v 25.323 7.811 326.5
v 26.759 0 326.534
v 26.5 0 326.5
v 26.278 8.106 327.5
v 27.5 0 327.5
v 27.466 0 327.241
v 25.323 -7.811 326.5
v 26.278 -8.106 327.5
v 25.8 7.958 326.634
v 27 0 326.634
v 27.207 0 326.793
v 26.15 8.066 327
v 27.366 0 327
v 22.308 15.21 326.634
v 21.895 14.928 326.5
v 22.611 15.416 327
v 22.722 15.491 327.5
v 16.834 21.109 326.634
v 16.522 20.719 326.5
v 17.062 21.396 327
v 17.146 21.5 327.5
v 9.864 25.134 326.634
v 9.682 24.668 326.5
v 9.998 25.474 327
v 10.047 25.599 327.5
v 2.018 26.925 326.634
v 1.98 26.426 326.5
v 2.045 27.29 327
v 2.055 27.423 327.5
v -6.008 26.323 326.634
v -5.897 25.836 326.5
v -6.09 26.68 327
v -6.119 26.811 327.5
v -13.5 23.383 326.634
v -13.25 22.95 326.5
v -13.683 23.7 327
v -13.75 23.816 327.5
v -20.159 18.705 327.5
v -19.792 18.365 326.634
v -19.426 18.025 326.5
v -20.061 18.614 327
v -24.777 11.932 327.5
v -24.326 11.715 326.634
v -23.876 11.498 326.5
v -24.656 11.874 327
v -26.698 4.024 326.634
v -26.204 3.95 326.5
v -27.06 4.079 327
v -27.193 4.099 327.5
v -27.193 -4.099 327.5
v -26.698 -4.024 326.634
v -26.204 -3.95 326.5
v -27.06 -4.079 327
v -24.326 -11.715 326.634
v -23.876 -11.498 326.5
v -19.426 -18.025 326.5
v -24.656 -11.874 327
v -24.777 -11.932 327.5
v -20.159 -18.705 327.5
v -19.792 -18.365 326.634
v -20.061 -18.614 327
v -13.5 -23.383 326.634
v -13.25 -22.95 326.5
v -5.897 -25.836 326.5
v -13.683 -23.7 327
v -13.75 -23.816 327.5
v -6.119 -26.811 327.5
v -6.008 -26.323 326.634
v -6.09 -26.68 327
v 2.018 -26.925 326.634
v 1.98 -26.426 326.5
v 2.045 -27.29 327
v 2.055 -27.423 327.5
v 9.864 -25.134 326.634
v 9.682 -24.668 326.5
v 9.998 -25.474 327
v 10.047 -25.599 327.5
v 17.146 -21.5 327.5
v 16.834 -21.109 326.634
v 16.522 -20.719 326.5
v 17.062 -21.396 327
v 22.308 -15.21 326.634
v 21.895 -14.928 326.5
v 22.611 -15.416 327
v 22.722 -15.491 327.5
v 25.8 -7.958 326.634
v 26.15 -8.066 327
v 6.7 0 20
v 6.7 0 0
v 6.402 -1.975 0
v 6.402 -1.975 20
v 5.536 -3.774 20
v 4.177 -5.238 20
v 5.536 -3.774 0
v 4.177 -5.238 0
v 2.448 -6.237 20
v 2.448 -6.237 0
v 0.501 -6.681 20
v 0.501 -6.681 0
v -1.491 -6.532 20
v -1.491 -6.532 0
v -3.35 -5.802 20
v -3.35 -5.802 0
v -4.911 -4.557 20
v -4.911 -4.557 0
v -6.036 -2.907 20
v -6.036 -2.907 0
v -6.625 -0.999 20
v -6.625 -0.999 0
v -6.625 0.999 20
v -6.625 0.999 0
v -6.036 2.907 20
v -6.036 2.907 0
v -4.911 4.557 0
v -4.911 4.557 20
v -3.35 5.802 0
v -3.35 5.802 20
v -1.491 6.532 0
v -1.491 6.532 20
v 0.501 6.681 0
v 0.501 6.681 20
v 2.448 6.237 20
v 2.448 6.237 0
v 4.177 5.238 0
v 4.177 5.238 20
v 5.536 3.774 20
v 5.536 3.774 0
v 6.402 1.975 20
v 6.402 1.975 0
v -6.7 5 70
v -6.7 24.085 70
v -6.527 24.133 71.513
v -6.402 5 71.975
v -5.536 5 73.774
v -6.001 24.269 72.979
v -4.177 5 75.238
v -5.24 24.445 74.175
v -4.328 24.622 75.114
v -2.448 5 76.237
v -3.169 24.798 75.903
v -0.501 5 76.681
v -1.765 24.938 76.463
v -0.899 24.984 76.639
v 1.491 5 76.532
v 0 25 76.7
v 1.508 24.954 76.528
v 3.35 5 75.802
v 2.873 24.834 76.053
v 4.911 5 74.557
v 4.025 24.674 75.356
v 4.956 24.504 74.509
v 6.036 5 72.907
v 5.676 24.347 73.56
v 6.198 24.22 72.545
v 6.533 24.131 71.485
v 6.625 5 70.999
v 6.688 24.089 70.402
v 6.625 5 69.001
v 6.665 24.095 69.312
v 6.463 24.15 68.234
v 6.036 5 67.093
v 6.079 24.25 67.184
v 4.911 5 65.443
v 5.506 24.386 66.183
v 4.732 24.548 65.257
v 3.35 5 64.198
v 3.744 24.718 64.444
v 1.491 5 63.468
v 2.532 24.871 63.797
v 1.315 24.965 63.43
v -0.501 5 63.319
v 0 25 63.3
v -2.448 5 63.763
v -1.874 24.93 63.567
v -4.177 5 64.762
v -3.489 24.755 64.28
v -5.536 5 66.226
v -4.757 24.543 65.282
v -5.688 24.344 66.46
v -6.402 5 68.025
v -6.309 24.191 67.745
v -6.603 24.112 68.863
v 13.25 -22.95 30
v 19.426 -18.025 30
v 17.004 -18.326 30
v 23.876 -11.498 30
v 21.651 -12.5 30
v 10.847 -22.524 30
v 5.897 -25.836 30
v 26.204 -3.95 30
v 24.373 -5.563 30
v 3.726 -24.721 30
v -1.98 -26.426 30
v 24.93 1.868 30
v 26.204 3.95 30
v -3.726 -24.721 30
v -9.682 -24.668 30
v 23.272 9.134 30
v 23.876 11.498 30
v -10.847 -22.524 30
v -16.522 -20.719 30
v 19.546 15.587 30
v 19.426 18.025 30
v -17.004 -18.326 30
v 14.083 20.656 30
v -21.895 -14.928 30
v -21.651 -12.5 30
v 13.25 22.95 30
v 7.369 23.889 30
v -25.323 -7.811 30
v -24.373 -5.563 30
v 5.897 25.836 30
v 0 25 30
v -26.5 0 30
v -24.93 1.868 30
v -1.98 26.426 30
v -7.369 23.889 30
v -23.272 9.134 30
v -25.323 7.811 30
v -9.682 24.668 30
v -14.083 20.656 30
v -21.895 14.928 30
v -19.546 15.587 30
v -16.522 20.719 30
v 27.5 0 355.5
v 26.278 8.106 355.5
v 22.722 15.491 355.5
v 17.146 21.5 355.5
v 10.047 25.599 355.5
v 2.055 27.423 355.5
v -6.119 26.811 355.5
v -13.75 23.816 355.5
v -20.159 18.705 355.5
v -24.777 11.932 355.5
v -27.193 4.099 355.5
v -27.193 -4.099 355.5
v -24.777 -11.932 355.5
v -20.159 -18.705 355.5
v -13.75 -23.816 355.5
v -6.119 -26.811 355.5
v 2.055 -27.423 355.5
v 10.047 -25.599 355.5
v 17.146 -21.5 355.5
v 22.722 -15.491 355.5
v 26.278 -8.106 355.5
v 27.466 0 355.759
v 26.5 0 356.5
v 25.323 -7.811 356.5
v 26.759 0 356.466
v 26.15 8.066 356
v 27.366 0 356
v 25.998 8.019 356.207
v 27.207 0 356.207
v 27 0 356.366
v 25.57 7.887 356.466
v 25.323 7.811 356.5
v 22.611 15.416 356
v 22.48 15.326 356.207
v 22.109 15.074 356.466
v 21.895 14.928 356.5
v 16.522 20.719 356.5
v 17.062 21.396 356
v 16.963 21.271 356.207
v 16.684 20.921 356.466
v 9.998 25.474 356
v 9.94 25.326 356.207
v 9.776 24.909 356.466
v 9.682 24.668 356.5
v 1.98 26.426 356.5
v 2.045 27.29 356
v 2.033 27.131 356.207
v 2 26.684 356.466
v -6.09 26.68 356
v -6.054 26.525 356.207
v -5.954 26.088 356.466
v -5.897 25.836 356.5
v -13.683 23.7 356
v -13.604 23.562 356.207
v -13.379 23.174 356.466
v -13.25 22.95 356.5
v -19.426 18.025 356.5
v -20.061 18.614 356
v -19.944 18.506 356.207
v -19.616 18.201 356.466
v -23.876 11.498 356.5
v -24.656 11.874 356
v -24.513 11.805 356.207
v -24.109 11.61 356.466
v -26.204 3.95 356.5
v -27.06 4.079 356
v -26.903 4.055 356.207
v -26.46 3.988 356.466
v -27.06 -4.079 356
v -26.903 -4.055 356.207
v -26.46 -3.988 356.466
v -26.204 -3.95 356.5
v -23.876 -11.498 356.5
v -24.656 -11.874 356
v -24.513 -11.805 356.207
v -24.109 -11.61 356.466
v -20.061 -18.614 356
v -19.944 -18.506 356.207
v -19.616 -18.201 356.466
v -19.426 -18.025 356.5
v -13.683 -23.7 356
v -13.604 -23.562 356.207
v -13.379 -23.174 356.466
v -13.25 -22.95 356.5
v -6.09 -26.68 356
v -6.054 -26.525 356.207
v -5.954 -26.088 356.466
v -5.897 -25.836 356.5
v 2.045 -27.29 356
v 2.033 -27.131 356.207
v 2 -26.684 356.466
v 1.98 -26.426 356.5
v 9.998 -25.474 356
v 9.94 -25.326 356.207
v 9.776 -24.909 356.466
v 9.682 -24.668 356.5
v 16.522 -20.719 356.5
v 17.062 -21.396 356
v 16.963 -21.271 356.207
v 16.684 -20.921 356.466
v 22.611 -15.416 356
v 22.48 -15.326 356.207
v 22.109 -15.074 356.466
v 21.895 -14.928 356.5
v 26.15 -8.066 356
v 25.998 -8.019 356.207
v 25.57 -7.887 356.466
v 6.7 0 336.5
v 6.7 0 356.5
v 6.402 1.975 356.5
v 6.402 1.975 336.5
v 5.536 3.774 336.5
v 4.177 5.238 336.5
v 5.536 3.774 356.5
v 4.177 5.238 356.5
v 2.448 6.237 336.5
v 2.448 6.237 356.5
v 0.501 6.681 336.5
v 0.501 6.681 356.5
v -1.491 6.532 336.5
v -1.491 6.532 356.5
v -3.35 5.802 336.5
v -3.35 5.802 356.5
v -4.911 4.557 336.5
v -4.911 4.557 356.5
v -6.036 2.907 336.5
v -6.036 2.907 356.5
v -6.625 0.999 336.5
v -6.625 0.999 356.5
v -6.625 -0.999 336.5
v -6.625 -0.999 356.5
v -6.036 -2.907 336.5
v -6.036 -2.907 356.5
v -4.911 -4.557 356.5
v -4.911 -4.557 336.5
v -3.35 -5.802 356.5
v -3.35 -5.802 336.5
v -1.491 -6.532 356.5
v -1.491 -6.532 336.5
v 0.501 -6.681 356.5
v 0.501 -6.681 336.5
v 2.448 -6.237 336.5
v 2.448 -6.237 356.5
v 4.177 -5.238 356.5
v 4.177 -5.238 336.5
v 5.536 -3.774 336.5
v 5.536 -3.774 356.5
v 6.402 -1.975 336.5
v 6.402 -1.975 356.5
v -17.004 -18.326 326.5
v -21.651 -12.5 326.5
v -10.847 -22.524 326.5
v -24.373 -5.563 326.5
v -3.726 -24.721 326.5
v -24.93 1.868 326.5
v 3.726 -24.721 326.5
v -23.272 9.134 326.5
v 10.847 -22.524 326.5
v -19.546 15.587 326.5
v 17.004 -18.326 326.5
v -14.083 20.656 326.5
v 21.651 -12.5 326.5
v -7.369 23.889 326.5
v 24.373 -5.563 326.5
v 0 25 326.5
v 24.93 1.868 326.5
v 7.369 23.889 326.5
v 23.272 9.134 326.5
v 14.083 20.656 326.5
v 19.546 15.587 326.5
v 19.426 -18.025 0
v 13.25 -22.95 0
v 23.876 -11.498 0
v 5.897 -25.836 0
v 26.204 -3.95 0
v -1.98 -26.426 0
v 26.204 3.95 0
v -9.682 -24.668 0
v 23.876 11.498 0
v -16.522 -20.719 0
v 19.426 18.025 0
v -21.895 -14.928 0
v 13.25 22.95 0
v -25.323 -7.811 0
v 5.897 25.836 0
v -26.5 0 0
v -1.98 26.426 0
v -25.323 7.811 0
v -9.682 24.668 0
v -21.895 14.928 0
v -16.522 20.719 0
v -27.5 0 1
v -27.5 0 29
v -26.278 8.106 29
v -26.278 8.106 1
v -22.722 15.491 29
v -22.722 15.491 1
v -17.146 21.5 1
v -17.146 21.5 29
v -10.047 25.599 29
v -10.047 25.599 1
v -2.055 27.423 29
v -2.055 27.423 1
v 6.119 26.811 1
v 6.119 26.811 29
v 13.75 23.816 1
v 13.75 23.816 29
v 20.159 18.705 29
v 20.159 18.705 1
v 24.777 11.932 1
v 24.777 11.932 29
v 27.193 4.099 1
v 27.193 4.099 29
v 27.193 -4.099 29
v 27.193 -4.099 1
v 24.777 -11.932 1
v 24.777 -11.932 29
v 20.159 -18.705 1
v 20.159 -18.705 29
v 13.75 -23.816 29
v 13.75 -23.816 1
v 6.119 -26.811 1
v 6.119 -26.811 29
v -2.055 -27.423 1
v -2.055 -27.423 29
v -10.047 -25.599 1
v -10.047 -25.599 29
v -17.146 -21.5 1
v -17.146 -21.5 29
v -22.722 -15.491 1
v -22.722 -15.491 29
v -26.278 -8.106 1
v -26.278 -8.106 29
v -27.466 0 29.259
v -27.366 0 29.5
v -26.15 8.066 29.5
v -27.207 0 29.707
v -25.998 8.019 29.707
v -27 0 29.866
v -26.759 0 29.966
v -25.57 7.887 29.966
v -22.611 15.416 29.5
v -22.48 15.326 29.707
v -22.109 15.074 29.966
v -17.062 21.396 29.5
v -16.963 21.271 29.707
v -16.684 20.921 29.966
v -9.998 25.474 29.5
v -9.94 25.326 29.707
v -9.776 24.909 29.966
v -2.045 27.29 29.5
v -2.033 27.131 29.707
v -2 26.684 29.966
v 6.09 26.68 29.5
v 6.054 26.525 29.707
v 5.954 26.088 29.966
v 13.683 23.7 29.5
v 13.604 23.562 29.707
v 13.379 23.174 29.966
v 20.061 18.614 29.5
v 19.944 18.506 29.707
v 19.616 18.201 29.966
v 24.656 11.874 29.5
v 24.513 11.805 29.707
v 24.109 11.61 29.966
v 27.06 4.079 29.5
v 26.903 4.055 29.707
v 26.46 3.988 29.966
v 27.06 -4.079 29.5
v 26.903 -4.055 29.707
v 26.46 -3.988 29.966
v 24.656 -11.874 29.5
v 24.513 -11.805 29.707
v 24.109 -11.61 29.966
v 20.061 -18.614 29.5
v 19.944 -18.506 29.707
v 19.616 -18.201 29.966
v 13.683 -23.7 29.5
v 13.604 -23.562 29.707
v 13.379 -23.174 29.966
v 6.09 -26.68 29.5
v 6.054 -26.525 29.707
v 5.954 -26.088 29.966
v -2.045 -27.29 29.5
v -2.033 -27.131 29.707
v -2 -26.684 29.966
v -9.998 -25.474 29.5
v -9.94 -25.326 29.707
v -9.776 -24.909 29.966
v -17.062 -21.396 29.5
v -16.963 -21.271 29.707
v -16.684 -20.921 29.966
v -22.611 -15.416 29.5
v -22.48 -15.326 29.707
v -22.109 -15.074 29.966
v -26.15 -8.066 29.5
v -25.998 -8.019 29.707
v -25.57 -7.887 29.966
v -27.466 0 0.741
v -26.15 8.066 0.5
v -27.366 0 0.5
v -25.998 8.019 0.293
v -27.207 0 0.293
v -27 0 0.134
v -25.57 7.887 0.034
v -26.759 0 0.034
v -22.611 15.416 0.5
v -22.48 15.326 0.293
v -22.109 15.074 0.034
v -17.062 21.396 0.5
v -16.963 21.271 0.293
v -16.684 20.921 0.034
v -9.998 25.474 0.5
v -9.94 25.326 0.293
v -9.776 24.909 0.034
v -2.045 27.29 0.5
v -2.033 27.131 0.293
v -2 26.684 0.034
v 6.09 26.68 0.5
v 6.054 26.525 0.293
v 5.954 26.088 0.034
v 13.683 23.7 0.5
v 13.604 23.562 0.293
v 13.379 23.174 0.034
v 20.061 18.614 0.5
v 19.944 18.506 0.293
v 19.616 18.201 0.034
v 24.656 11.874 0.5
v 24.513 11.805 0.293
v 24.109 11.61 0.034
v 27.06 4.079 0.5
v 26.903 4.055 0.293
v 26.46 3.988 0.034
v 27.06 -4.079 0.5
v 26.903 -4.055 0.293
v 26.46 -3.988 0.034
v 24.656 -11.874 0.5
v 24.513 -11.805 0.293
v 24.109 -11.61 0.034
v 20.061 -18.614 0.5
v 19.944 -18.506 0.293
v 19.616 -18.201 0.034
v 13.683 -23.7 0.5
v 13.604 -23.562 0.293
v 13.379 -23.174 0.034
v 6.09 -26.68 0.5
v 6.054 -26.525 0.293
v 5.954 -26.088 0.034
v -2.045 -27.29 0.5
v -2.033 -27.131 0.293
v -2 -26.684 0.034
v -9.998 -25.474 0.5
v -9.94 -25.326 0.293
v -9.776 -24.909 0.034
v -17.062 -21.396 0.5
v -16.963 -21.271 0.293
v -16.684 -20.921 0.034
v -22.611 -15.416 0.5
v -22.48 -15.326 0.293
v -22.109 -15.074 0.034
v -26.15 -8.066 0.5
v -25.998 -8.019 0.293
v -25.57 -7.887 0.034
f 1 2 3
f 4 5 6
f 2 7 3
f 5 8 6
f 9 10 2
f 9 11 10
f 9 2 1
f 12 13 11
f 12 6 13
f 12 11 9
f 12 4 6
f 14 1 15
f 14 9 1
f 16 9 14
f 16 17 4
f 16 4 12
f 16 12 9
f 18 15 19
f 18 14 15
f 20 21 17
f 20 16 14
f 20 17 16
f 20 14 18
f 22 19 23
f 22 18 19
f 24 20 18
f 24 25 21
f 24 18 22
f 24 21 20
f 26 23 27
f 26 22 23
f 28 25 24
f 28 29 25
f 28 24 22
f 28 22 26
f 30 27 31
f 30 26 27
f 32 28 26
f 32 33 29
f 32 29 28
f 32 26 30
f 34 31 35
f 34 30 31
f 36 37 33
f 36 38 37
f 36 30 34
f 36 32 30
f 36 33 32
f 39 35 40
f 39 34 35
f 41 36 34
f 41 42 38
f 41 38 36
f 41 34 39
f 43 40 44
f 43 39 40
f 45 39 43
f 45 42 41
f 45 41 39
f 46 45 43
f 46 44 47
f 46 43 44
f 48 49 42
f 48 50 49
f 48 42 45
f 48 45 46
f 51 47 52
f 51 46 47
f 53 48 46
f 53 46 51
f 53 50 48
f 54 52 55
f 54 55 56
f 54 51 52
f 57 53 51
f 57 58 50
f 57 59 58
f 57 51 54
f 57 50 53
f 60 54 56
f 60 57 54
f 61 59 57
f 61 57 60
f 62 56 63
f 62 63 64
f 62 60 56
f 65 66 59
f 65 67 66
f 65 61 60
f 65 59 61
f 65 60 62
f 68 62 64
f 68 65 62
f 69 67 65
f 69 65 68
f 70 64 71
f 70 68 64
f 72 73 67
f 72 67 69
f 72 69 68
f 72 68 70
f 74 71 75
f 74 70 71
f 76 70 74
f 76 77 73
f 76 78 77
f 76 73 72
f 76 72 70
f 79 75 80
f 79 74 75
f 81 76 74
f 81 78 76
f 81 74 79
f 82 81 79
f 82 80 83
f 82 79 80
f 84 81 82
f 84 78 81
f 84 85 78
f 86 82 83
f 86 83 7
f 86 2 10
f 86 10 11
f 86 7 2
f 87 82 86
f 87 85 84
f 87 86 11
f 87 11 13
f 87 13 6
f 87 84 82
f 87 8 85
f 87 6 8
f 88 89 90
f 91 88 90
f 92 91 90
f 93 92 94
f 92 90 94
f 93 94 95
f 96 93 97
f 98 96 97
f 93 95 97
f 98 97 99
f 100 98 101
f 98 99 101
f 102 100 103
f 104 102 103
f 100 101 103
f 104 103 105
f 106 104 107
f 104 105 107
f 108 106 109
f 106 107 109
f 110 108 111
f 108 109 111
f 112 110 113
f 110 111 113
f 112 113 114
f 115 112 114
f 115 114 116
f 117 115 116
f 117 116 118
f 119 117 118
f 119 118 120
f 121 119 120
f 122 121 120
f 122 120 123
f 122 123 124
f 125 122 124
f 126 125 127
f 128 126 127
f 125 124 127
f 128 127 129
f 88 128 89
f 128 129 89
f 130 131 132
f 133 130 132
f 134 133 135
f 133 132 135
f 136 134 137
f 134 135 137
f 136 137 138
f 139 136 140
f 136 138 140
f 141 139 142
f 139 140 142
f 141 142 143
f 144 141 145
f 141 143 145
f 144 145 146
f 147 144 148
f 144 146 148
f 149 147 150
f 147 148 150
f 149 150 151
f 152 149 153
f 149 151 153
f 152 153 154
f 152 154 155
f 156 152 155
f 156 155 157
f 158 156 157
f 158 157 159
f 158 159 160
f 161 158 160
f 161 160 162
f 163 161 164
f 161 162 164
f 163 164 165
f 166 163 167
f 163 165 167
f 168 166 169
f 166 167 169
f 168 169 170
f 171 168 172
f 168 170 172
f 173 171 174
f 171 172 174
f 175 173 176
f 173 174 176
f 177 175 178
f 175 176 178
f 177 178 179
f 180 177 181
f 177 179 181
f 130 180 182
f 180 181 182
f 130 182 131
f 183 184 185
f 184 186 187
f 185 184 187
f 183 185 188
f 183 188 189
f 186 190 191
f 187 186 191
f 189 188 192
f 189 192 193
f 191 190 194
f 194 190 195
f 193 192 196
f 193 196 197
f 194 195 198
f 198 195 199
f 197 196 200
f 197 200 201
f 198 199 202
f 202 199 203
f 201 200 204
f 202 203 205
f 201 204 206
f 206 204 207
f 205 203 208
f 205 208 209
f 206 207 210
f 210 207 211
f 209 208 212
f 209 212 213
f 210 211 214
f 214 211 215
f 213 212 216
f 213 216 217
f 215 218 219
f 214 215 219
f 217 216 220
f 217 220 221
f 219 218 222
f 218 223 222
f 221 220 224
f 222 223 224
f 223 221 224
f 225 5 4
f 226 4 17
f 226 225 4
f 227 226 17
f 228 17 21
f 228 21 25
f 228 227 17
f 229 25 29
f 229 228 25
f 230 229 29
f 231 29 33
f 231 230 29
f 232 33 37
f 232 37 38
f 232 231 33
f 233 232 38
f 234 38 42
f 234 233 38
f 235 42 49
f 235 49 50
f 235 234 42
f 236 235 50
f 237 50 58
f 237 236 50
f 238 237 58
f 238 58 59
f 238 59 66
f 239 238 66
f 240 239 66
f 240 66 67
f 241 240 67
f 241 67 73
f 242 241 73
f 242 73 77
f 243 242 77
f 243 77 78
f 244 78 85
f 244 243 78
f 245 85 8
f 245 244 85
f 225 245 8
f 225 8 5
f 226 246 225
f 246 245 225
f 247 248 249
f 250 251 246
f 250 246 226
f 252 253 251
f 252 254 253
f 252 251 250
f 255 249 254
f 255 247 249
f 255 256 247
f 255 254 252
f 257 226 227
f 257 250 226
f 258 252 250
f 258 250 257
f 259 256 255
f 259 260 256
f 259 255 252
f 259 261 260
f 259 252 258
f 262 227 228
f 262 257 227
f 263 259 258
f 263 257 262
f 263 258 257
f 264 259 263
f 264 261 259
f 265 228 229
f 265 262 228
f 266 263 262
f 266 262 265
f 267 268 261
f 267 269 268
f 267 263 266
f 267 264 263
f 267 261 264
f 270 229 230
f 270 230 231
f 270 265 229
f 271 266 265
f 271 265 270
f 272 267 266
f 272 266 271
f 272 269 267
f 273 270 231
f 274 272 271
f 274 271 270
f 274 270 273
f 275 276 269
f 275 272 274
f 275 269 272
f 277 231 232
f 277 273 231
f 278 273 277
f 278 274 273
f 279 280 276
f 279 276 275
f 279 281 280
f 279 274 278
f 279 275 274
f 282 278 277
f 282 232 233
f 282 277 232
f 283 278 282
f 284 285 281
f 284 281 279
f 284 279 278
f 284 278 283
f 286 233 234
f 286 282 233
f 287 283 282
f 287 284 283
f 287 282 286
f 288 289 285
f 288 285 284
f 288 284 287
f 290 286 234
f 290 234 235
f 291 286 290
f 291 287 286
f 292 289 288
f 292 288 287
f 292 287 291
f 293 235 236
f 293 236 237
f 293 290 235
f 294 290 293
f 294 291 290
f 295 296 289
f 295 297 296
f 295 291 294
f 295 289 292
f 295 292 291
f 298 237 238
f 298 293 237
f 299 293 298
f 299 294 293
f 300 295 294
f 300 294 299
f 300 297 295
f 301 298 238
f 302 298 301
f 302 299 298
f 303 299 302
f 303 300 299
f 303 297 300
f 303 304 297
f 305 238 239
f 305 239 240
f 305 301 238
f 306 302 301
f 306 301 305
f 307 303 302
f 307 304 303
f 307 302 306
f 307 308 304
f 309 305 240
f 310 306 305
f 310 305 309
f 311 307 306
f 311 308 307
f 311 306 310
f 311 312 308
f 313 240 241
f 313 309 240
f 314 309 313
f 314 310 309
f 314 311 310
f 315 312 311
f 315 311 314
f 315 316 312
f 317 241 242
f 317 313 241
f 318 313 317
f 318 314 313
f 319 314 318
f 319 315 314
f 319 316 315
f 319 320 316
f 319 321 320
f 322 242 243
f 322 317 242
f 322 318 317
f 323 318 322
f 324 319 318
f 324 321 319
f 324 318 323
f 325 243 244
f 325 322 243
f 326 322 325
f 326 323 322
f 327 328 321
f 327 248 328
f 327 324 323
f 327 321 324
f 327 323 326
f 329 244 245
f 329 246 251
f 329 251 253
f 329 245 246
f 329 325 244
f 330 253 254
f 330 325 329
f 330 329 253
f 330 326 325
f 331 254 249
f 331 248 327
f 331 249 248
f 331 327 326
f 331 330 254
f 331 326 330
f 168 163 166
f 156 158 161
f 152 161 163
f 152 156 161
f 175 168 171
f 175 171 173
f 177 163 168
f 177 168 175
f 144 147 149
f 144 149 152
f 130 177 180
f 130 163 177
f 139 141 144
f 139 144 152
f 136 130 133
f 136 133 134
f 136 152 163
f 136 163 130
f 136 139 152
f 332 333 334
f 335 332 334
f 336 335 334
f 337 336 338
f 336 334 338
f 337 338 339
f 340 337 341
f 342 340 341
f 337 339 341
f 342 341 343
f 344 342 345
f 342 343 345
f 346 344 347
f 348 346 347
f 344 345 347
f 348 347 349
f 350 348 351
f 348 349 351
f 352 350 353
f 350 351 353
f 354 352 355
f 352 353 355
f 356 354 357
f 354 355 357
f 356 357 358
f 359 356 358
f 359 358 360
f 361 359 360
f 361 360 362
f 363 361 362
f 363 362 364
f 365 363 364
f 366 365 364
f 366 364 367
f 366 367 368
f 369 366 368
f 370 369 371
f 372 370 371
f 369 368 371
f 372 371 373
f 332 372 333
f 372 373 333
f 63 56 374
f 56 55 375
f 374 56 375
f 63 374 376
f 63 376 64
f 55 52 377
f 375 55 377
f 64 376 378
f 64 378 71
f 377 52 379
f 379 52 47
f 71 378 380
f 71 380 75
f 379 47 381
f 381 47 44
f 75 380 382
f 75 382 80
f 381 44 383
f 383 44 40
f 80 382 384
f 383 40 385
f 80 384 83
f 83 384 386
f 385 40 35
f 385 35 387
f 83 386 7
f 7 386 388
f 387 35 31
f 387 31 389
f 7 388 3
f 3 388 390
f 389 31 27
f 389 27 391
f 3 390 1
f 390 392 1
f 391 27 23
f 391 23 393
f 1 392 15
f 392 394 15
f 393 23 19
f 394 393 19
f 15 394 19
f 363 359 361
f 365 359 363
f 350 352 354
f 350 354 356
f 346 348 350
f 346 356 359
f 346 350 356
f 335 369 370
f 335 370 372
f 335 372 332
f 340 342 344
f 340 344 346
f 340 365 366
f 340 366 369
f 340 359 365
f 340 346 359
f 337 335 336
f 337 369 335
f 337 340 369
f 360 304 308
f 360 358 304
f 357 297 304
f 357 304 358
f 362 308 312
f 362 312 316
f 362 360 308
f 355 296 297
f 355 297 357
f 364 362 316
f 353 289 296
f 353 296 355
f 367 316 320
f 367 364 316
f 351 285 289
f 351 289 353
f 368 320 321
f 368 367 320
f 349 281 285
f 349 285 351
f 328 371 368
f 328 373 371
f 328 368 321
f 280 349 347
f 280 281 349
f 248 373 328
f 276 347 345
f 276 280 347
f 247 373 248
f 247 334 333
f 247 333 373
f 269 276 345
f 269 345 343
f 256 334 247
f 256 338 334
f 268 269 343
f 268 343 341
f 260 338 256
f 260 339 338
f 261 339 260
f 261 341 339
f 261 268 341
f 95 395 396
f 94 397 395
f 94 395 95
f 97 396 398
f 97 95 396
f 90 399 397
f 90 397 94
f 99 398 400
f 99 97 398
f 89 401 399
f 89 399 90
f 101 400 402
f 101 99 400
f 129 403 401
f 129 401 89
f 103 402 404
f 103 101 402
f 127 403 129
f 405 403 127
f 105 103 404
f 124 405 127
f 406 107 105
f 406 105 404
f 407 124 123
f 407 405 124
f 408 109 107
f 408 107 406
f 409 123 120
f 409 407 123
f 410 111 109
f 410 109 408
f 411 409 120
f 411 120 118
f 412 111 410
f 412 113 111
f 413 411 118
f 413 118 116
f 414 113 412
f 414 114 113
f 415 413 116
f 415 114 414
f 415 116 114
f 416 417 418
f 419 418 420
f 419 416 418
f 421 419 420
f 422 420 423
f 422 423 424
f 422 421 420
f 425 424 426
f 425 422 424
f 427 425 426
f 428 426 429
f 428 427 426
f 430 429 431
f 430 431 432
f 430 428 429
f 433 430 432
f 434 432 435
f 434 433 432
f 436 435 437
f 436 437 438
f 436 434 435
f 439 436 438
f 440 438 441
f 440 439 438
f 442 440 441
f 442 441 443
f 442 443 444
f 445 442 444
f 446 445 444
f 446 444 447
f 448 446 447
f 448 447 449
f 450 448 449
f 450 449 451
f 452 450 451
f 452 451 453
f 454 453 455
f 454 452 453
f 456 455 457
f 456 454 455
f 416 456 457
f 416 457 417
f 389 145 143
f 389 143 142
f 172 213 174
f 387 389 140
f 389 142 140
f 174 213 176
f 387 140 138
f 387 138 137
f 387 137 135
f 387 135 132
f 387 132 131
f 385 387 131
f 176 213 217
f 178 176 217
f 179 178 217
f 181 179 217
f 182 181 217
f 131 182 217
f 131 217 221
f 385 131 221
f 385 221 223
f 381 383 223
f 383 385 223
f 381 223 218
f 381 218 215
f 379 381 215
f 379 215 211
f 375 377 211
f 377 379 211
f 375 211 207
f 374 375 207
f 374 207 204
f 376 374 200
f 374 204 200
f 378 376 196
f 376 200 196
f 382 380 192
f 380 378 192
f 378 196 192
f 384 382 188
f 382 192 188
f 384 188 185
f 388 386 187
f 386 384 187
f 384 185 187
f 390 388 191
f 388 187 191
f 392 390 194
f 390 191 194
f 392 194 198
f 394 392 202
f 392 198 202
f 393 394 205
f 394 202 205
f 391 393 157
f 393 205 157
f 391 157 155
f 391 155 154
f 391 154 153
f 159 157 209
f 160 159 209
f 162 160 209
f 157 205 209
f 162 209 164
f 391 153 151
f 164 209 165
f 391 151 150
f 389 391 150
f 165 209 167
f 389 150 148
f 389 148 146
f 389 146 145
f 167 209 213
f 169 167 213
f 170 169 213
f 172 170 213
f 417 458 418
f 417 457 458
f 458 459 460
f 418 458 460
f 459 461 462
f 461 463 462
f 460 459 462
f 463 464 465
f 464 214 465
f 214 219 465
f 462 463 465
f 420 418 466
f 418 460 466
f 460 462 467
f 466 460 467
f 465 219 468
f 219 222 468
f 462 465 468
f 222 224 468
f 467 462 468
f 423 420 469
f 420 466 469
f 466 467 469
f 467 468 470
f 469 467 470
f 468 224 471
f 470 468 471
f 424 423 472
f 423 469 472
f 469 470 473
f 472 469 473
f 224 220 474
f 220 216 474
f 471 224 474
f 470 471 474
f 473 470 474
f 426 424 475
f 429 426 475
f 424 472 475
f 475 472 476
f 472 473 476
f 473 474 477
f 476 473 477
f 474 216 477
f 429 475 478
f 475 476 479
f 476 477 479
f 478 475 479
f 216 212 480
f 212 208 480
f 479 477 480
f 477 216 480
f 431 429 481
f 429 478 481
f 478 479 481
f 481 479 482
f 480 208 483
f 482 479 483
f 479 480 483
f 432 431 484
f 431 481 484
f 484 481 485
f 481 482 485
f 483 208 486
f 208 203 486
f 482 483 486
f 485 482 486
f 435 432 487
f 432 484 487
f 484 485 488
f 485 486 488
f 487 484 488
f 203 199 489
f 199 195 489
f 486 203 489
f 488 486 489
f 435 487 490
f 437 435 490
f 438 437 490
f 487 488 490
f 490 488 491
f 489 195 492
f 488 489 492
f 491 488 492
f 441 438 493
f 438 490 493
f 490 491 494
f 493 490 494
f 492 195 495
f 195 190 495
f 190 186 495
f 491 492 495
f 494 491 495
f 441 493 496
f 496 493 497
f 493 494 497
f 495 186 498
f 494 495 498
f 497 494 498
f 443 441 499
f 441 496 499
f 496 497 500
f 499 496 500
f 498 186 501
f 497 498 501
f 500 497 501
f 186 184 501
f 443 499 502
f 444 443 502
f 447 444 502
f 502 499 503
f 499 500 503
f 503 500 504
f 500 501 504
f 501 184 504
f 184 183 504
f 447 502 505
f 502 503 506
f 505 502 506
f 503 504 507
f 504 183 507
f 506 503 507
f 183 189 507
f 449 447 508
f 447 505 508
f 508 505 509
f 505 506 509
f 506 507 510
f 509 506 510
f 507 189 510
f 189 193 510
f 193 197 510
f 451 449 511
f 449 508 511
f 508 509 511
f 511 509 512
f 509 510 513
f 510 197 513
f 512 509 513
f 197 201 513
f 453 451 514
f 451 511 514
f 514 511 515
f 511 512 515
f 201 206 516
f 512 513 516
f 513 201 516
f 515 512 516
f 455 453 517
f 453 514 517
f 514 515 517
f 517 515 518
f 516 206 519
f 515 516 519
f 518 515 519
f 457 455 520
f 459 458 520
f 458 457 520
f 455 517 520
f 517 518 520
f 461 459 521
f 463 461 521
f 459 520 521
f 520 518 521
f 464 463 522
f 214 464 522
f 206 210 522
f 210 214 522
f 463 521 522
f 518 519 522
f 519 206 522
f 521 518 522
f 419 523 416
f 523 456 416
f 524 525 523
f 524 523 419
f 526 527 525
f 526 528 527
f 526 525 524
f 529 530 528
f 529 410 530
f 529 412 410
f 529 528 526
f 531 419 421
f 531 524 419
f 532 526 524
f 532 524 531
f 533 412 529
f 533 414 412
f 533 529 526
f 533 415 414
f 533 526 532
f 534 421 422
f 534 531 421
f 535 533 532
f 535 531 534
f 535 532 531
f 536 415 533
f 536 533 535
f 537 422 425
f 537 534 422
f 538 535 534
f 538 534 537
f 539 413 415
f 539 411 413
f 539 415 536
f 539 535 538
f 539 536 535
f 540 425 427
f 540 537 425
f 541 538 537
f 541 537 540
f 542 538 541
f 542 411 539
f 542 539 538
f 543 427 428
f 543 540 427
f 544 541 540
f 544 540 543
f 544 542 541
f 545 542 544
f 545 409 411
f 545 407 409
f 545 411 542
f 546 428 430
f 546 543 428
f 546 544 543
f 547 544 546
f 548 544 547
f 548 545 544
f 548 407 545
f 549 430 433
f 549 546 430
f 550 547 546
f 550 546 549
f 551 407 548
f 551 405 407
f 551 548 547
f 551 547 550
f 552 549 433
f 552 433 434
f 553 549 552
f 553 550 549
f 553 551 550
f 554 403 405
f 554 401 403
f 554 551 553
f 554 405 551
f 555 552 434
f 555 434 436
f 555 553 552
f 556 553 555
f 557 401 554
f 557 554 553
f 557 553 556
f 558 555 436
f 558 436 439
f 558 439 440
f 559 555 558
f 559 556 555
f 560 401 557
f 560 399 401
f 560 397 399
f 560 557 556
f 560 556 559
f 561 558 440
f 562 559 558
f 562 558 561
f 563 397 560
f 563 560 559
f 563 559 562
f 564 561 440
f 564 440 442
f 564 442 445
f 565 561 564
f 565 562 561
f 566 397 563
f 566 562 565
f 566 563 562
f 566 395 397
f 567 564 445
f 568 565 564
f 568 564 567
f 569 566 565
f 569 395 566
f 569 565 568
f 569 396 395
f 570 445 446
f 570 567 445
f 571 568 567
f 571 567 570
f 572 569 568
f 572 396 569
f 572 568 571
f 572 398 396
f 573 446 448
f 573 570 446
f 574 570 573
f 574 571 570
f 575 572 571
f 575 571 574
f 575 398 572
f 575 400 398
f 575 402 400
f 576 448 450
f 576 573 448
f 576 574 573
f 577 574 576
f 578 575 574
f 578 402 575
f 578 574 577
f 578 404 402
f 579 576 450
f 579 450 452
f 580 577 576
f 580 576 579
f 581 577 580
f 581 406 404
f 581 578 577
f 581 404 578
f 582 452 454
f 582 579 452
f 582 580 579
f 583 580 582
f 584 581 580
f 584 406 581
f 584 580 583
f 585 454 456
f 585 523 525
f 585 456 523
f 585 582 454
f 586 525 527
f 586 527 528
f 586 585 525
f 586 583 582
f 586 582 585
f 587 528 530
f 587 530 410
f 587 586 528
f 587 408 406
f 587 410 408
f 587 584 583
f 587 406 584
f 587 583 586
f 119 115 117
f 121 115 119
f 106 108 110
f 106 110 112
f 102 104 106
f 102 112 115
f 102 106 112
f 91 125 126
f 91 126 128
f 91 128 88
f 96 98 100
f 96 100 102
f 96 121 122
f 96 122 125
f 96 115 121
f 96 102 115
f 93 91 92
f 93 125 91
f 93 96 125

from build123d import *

# Parameters (mm, degrees)
SKETCH1_R           = 25
BOSS_EXTRUDE1_DEPTH = 356.5
SKETCH2_R           = 27.5
BOSS_EXTRUDE2_DEPTH = 30
SKETCH3_R           = 27.5
BOSS_EXTRUDE3_DEPTH = 30
SKETCH4_R           = 6.7
CUT_EXTRUDE1_DEPTH  = 20
SKETCH5_R           = 6.7
CUT_EXTRUDE2_DEPTH  = 20
SKETCH6_R           = 6.7
CUT_EXTRUDE3_DEPTH  = 20
FILLET1_R           = 1


with BuildPart() as part:
    # Sketch1 → Boss-Extrude1 (new body)
    with BuildSketch(Plane(origin=(0, 0, 0), x_dir=(0, 1, 0), z_dir=(0, 0, 1))):
        Circle(SKETCH1_R)
    extrude(amount=BOSS_EXTRUDE1_DEPTH)

    # Sketch2 → Boss-Extrude2 (add)
    with BuildSketch(Plane.XY.offset(356.5)):
        Circle(SKETCH2_R)
    extrude(amount=-BOSS_EXTRUDE2_DEPTH)

    # Sketch3 → Boss-Extrude3 (add)
    with BuildSketch(Plane(origin=(0, 0, 0), x_dir=(-1, 0, 0), z_dir=(0, 0, -1))):
        Circle(SKETCH3_R)
    extrude(amount=-BOSS_EXTRUDE3_DEPTH)

    # Sketch4 → Cut-Extrude1 (cut)
    with BuildSketch(Plane(origin=(0, 0, 0), x_dir=(1, 0, 0), z_dir=(0, 0, -1))):
        Circle(SKETCH4_R)
    extrude(amount=-CUT_EXTRUDE1_DEPTH, mode=Mode.SUBTRACT)

    # Sketch5 → Cut-Extrude2 (cut)
    with BuildSketch(Plane.XY.offset(356.5)):
        Circle(SKETCH5_R)
    extrude(amount=-CUT_EXTRUDE2_DEPTH, mode=Mode.SUBTRACT)

    # Sketch6 → Cut-Extrude3 (cut)
    with BuildSketch(Plane(origin=(0, 25, 0), x_dir=(-1, 0, 0), z_dir=(0, 1, 0))):
        with Locations((0, 70)):
            Circle(SKETCH6_R)
    extrude(amount=-CUT_EXTRUDE3_DEPTH, mode=Mode.SUBTRACT)

    # Fillet1
    fillet1_edges = [part.edges().sort_by_distance(p)[0] for p in [
        (27.5, 0, 30),
        (27.5, 0, 0),
        (-27.5, 0, 326.5),
        (-27.5, 0, 356.5),
    ]]
    fillet(fillet1_edges, radius=FILLET1_R)


solid = part.part
